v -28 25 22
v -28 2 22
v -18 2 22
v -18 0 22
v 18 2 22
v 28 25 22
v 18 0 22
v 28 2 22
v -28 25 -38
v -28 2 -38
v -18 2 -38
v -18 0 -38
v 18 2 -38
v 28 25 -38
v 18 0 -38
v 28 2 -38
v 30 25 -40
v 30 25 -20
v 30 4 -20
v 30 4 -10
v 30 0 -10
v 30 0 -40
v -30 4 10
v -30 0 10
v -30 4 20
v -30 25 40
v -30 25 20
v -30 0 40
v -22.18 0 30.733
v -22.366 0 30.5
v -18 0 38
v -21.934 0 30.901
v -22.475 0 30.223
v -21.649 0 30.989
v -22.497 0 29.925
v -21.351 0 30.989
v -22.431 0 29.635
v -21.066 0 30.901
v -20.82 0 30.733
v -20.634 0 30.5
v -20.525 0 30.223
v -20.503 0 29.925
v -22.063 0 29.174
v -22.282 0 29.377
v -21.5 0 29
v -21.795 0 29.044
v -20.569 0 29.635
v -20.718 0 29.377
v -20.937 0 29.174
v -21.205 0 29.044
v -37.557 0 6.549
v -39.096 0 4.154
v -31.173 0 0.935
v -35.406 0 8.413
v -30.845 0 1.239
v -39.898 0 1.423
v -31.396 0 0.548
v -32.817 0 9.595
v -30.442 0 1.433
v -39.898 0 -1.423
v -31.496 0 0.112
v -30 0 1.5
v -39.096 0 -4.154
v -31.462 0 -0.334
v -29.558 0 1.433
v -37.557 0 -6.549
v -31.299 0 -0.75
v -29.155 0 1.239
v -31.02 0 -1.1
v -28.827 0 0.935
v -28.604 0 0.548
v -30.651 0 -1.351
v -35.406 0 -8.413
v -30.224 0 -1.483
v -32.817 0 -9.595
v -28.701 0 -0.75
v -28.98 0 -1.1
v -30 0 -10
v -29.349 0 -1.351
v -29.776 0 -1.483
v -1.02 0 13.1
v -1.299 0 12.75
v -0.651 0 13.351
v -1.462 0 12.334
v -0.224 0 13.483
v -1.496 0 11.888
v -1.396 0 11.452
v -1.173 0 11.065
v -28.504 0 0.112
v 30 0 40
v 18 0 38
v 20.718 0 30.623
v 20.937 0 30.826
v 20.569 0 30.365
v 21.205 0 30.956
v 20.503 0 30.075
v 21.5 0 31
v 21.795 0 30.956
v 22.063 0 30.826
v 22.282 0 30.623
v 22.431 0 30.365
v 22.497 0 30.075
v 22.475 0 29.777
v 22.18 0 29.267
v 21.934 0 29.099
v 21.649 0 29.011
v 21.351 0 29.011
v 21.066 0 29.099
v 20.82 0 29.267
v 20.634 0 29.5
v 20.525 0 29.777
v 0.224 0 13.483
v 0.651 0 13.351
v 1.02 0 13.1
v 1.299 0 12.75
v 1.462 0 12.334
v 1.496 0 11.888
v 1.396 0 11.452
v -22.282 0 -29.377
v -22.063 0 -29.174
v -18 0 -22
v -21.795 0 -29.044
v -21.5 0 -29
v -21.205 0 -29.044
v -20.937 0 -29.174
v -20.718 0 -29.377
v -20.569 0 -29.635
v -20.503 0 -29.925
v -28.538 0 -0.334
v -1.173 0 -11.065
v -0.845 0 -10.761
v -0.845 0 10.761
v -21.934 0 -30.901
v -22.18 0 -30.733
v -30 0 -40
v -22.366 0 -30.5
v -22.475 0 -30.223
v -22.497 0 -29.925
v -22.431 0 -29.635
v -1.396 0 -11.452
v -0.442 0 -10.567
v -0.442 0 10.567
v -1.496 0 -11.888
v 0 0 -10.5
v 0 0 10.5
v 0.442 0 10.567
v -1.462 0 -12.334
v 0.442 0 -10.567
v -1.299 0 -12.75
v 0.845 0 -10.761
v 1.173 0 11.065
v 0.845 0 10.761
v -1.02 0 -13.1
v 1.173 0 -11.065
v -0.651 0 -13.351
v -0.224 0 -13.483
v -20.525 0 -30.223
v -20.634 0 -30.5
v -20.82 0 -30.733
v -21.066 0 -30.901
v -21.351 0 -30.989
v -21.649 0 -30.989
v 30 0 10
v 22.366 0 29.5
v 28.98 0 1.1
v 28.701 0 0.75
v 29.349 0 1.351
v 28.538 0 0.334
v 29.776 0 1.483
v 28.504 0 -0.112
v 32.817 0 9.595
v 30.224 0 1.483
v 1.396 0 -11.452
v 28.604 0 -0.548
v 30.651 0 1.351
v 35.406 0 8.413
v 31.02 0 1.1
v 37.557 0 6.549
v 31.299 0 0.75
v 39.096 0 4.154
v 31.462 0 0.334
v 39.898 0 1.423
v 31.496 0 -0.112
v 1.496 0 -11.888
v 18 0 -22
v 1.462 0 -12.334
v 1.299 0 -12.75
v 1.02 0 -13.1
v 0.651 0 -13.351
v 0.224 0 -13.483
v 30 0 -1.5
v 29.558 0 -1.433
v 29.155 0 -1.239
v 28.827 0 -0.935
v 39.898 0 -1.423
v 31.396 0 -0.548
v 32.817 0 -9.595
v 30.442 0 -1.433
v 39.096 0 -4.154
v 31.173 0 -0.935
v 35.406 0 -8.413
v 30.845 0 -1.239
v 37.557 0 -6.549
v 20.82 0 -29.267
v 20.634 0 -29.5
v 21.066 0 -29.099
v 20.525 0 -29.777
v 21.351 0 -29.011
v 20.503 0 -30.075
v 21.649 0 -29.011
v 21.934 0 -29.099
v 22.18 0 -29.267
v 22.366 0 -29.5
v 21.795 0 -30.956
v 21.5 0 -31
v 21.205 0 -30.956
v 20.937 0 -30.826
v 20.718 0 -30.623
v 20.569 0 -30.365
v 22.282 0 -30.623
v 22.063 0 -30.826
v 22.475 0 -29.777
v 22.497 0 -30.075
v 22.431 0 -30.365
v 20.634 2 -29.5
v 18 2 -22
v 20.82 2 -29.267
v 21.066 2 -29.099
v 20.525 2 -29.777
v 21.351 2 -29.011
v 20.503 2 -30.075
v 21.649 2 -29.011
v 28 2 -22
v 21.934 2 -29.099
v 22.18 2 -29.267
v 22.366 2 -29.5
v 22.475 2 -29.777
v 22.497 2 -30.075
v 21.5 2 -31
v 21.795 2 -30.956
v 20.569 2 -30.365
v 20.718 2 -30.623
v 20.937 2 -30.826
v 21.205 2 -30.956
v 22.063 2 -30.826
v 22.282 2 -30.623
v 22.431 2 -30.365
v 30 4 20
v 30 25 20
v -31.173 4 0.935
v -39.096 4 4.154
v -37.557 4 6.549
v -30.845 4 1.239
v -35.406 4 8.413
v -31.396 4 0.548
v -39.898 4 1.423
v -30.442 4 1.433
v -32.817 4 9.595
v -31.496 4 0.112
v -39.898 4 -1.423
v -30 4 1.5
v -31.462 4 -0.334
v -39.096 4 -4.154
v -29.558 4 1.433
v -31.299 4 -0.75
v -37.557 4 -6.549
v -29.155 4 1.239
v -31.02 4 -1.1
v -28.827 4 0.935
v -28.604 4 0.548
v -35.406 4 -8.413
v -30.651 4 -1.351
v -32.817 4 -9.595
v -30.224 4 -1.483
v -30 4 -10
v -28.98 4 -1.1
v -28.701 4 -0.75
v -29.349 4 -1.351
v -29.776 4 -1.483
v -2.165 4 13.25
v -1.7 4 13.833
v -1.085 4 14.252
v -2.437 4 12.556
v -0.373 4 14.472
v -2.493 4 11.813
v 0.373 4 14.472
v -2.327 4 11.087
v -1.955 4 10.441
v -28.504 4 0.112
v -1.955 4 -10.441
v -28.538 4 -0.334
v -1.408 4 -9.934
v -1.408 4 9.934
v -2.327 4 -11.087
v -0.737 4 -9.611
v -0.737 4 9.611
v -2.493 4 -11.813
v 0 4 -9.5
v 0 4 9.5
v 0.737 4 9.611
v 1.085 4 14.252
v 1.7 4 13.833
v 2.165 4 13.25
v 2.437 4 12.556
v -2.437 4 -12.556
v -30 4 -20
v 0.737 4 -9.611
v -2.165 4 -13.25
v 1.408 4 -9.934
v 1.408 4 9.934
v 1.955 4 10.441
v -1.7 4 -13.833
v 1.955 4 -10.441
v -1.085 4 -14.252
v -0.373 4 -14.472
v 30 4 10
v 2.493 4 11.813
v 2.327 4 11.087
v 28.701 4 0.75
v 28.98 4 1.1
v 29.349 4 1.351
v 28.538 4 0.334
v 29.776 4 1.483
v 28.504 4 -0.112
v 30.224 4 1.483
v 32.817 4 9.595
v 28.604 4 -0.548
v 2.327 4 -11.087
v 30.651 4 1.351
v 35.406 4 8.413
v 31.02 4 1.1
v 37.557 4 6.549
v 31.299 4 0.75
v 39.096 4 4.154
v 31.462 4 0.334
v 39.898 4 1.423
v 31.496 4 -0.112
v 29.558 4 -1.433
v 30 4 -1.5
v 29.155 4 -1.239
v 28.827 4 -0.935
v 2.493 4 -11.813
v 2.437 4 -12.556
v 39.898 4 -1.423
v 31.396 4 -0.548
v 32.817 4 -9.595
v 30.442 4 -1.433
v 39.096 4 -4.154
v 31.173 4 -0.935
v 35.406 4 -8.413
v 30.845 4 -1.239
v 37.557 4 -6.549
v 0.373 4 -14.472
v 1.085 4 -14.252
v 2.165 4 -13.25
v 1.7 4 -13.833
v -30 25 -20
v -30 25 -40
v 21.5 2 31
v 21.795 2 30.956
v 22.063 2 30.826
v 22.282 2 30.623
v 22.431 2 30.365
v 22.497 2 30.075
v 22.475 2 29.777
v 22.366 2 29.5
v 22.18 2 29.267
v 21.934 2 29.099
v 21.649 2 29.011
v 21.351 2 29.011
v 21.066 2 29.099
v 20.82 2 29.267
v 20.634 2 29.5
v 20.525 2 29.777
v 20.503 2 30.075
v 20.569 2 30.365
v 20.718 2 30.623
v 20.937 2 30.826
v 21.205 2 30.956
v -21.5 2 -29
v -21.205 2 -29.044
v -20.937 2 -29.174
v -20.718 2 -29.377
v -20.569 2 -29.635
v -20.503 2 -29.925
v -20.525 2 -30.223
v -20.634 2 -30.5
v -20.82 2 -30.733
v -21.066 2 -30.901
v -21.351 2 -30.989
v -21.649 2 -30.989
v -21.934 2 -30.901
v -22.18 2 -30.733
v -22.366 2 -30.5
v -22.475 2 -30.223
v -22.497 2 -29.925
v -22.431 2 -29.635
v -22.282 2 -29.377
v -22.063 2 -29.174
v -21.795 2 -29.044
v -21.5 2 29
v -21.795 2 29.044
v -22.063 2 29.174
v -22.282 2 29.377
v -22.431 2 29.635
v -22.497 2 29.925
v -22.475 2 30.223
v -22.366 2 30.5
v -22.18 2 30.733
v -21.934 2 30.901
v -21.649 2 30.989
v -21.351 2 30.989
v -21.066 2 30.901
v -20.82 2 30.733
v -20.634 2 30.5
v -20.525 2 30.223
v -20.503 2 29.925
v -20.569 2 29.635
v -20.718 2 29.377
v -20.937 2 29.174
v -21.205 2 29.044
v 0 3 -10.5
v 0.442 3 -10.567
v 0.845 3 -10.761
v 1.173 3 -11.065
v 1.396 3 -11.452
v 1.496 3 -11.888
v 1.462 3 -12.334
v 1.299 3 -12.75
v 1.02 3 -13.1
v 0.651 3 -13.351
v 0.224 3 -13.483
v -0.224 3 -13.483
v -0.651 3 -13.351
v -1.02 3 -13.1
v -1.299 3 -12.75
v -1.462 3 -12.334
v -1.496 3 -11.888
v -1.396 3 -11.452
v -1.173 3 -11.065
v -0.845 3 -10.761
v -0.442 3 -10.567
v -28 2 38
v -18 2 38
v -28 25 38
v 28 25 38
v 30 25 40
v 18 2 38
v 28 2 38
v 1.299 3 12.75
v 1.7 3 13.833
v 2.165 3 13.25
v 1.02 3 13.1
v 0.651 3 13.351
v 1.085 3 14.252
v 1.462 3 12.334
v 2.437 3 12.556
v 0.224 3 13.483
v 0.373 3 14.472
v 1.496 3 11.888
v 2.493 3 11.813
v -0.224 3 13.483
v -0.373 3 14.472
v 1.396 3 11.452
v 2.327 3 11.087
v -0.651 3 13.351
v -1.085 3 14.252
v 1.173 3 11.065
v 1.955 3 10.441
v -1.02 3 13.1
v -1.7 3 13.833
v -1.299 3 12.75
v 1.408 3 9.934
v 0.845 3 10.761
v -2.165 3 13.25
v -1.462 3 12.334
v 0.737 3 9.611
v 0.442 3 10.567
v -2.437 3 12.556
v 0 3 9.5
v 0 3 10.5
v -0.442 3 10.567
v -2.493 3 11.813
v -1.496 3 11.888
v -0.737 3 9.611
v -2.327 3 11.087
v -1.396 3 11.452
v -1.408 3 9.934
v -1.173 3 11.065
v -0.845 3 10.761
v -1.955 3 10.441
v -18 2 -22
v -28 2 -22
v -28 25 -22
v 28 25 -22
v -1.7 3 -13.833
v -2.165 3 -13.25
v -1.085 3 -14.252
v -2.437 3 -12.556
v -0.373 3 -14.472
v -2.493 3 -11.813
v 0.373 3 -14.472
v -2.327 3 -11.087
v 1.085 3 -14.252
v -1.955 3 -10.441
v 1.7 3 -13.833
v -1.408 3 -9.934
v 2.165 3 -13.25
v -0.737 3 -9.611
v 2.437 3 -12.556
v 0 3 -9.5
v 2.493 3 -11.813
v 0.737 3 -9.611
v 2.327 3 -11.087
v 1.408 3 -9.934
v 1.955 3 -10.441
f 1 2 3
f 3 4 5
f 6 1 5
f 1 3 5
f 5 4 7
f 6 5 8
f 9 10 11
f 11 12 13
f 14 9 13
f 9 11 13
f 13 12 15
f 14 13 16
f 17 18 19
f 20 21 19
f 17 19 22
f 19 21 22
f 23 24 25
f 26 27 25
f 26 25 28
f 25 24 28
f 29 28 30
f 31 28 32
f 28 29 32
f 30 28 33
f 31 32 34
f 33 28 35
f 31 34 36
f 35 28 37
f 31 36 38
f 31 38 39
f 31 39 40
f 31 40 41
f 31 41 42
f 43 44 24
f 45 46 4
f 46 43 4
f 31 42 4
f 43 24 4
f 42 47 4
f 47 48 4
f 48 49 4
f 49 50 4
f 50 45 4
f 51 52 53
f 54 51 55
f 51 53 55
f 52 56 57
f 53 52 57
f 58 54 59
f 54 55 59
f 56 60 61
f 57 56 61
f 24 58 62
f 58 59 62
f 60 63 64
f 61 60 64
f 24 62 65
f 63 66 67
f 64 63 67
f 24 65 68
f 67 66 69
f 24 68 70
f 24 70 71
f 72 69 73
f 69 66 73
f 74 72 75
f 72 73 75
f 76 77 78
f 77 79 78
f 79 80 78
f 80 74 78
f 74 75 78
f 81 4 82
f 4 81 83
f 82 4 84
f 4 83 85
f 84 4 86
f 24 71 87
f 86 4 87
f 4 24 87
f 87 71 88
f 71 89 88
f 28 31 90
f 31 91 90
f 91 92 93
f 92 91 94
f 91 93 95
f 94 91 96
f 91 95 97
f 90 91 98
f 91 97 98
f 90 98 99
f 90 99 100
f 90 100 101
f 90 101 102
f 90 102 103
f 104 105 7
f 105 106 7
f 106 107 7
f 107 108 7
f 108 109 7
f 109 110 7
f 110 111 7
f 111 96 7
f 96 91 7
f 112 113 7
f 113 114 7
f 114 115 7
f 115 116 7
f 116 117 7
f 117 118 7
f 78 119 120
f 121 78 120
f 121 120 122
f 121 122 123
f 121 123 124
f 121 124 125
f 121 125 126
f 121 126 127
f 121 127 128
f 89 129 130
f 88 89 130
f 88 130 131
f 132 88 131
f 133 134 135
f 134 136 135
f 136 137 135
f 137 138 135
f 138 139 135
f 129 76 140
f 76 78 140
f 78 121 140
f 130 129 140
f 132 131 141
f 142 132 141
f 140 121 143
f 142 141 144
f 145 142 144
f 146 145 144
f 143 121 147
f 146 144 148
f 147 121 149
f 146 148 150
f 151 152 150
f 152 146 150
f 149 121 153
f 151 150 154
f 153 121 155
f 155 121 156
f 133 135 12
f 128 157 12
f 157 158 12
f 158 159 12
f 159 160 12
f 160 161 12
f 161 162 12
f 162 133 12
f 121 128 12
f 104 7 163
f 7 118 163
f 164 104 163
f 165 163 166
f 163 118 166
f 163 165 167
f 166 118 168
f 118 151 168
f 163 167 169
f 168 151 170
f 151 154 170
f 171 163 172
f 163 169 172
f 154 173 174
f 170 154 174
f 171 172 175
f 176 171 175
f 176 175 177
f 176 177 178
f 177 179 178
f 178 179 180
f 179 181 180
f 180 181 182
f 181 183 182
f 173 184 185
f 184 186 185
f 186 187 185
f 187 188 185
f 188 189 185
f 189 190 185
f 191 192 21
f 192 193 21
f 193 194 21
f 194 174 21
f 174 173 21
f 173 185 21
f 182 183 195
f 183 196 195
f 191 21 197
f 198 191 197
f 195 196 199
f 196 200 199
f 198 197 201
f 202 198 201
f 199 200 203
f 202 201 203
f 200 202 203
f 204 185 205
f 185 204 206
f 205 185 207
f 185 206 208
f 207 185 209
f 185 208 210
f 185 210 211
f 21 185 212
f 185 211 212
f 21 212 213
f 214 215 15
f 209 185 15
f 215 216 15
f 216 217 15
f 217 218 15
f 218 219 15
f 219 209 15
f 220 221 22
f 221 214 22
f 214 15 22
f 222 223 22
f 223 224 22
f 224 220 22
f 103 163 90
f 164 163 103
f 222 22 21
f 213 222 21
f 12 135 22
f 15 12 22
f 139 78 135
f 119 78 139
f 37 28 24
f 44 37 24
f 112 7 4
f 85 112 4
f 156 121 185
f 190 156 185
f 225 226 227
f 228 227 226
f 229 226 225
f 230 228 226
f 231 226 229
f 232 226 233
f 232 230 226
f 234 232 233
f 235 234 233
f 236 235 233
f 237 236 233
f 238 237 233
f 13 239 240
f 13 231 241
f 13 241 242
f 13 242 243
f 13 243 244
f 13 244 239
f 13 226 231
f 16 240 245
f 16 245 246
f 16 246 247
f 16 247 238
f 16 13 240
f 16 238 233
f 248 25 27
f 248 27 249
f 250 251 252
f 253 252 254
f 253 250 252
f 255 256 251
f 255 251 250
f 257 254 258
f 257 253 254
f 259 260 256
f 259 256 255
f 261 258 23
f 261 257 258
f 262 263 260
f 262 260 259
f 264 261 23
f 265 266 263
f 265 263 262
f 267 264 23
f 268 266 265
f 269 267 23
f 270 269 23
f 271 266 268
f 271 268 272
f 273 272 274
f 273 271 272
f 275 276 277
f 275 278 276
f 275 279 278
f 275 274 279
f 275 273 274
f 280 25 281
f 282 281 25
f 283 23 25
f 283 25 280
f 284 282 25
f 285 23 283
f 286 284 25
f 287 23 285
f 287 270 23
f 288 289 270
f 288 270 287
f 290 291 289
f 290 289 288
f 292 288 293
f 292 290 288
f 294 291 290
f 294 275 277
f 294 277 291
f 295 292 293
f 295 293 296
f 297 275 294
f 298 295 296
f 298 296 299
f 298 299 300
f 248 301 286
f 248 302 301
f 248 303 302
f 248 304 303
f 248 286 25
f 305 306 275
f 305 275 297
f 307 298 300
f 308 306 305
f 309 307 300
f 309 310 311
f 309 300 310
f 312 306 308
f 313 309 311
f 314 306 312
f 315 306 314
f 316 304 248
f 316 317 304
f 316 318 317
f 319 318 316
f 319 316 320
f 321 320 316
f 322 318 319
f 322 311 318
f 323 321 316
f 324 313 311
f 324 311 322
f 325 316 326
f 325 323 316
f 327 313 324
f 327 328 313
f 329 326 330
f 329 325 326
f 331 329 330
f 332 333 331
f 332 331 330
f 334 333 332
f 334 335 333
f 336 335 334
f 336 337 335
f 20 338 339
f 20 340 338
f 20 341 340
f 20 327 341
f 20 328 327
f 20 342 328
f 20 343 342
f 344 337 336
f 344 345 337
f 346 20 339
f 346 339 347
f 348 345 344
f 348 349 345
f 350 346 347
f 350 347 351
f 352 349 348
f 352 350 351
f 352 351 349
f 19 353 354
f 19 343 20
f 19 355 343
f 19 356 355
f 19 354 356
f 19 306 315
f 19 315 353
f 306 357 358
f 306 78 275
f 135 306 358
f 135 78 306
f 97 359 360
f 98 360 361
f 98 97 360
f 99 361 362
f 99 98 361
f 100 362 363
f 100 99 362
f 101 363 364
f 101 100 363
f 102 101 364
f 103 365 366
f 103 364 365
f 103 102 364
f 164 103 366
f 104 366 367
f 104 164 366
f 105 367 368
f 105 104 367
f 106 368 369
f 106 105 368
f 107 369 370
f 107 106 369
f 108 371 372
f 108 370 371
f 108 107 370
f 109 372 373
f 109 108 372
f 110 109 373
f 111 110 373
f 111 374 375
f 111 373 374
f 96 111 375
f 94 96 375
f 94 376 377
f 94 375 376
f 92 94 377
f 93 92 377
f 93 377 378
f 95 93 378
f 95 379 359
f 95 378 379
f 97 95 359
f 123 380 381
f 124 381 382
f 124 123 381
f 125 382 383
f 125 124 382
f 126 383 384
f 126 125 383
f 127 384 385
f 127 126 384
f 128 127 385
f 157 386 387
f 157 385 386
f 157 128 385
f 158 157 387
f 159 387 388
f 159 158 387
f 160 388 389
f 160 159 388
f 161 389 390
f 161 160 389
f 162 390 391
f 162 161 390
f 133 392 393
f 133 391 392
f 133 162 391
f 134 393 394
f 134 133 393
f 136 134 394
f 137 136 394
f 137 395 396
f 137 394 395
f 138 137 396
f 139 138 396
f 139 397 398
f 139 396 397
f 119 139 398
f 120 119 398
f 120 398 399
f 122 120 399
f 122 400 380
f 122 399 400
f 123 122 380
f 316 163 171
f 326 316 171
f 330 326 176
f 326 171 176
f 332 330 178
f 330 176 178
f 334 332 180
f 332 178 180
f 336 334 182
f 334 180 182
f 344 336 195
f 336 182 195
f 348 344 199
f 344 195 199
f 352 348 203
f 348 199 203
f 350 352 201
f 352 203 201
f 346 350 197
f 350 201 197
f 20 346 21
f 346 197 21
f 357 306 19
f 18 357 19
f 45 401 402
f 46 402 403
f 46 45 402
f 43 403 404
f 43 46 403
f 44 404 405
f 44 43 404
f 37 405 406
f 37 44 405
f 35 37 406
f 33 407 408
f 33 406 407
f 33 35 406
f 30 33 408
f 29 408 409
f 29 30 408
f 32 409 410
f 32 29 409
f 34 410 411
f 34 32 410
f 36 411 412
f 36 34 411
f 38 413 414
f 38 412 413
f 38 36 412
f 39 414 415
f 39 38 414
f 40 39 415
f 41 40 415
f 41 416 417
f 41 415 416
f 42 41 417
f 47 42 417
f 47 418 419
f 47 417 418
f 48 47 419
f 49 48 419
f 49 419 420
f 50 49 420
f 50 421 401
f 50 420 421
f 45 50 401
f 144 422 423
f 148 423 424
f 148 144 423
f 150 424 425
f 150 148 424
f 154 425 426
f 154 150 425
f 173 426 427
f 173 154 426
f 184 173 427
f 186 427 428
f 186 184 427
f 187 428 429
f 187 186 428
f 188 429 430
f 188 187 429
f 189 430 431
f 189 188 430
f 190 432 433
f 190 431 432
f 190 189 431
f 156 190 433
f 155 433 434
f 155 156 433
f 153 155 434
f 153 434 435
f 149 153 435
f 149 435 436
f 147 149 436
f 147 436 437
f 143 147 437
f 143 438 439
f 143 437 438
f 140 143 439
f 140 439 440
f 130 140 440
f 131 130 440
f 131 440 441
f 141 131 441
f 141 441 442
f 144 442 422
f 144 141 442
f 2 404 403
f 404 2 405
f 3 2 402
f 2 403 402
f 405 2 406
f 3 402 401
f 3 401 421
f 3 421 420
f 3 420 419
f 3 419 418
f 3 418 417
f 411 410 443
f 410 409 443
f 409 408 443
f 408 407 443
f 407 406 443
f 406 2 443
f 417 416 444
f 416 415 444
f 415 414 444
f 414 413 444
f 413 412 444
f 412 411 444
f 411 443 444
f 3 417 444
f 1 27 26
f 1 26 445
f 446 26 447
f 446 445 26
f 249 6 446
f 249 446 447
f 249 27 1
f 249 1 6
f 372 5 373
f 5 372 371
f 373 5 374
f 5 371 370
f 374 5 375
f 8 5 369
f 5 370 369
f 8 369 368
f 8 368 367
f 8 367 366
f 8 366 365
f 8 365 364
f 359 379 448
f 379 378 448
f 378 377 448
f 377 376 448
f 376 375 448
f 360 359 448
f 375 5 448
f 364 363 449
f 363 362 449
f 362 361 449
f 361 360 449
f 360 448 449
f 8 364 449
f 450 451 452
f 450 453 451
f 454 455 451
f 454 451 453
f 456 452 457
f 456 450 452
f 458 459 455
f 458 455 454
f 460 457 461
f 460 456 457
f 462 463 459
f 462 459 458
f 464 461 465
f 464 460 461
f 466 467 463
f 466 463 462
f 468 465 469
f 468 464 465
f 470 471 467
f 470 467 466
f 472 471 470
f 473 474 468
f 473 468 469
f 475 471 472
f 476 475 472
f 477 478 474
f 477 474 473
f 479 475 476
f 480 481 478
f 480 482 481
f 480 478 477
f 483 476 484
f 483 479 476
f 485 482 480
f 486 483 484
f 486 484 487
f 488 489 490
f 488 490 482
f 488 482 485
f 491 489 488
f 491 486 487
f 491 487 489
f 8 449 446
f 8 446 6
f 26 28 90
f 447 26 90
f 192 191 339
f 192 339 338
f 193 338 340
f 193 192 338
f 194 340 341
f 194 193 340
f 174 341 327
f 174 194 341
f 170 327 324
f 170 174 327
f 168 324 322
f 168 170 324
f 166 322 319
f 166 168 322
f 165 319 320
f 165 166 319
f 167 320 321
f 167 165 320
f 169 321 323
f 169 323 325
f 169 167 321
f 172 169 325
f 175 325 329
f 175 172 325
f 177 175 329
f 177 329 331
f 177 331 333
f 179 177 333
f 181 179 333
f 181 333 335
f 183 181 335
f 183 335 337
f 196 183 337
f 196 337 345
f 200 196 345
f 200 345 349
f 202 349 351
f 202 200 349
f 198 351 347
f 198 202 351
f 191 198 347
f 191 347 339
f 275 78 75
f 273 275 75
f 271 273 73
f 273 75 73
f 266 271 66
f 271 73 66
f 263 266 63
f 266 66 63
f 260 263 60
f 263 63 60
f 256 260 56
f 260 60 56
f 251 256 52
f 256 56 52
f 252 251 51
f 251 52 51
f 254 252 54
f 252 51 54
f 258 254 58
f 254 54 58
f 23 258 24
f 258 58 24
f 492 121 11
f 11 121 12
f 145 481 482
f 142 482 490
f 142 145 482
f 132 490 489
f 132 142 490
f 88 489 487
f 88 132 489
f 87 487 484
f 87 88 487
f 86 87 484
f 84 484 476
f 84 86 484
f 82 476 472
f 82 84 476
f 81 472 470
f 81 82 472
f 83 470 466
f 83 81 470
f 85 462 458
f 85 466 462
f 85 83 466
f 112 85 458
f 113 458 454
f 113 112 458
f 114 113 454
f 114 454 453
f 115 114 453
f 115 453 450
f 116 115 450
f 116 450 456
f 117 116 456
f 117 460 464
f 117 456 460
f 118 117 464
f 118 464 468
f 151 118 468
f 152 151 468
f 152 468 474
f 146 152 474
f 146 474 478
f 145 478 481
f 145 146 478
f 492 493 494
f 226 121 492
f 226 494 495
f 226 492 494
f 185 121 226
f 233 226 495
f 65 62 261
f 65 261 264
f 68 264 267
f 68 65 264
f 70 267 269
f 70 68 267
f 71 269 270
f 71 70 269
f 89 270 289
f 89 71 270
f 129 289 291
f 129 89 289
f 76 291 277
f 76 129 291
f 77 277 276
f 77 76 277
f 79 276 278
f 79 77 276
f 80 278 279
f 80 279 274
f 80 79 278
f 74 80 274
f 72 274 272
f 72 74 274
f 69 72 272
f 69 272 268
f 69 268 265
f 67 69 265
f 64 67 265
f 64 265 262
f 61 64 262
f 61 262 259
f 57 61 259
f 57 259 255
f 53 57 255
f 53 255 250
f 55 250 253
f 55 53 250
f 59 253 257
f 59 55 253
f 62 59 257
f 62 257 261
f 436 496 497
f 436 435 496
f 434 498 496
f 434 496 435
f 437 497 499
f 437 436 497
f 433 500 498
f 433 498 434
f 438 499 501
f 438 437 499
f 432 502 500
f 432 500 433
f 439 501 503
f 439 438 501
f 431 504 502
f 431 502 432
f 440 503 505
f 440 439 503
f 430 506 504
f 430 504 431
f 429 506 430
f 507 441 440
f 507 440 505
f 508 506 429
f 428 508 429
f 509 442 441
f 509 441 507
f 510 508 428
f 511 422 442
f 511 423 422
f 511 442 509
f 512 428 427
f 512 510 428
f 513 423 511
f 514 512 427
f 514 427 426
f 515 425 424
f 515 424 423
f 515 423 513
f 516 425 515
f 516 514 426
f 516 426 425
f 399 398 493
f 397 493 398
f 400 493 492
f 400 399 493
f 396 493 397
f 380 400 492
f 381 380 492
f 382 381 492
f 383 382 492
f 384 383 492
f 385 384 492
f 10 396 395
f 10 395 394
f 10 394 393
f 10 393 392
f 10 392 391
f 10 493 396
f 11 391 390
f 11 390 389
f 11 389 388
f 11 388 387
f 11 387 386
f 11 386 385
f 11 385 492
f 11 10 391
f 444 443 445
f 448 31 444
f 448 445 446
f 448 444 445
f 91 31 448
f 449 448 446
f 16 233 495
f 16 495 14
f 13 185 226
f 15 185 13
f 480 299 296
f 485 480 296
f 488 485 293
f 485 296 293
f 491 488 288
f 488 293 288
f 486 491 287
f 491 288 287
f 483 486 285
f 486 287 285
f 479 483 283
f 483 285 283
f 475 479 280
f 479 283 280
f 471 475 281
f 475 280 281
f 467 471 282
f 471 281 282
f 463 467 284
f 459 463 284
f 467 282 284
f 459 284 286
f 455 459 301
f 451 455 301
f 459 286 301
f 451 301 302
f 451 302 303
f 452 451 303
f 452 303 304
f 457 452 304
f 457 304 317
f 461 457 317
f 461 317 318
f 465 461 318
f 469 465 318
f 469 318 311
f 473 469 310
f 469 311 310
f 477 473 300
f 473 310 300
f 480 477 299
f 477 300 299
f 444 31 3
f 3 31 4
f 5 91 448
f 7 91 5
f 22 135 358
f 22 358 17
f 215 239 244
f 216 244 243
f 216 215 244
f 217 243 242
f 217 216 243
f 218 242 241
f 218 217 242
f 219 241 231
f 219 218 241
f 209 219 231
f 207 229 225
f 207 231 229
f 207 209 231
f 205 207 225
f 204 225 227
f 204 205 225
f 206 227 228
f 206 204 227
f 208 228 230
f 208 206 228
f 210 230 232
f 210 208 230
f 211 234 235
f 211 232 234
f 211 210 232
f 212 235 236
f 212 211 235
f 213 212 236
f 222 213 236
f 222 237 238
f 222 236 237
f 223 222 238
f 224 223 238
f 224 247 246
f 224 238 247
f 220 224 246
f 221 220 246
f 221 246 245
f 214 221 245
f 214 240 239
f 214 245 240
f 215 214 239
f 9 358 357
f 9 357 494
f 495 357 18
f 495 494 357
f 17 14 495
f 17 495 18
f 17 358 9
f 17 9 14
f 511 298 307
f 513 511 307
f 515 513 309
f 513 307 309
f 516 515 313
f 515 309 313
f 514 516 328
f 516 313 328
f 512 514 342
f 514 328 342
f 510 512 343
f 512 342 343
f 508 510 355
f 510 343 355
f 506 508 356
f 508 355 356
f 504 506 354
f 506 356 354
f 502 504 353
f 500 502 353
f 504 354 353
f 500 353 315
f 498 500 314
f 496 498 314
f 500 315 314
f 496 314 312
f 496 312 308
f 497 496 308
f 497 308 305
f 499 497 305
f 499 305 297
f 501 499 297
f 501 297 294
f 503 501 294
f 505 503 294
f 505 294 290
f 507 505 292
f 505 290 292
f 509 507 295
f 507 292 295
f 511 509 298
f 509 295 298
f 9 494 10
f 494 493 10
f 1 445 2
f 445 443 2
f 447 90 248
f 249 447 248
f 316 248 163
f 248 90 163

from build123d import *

# Parameters (mm, degrees)
SKETCH1_R           = 1.5
SKETCH1_R_2         = 1
SKETCH1_W           = 36
SKETCH1_H           = 16
BOSS_EXTRUDE1_DEPTH = 4
SKETCH3_W           = 60
SKETCH3_H           = 20
SKETCH3_W_2         = 56
SKETCH3_H_2         = 16
BOSS_EXTRUDE2_DEPTH = 21
SKETCH4_R           = 2.5
CUT_EXTRUDE1_DEPTH  = 1
SKETCH5_W           = 56
SKETCH5_H           = 16
CUT_EXTRUDE2_DEPTH  = 23


with BuildPart() as part:
    # Sketch1 → Boss-Extrude1 (new body)
    with BuildSketch(Plane(origin=(0, 0, 0), x_dir=(1, 0, 0), z_dir=(0, 1, 0))):
        with BuildLine():
            Line((-30, -40), (30, -40))
            Line((30, -40), (30, -10))
            ThreePointArc((30, -10), (40, 0), (30, 10))
            Line((30, 10), (30, 40))
            Line((30, 40), (-30, 40))
            Line((-30, 40), (-30, 10))
            ThreePointArc((-30, 10), (-40, 0), (-30, -10))
            Line((-30, -10), (-30, -40))
        make_face()
        with Locations(Location((30, 0, 0), (0, 0, 90))):
            Circle(SKETCH1_R, mode=Mode.SUBTRACT)
        with Locations(Location((-30, 0, 0), (0, 0, 270))):
            Circle(SKETCH1_R, mode=Mode.SUBTRACT)
        with Locations(Location((0, 12, 0), (0, 0, 270))):
            Circle(SKETCH1_R, mode=Mode.SUBTRACT)
        with Locations(Location((0, -12, 0), (0, 0, 90))):
            Circle(SKETCH1_R, mode=Mode.SUBTRACT)
        with Locations(Location((-21.5, 30, 0), (0, 0, 270))):
            Circle(SKETCH1_R_2, mode=Mode.SUBTRACT)
        with Locations(Location((21.5, 30, 0), (0, 0, 90))):
            Circle(SKETCH1_R_2, mode=Mode.SUBTRACT)
        with Locations(Location((21.5, -30, 0), (0, 0, 270))):
            Circle(SKETCH1_R_2, mode=Mode.SUBTRACT)
        with Locations(Location((-21.5, -30, 0), (0, 0, 90))):
            Circle(SKETCH1_R_2, mode=Mode.SUBTRACT)
        with Locations((0, -30)):
            Rectangle(SKETCH1_W, SKETCH1_H, mode=Mode.SUBTRACT)
        with Locations((0, 30)):
            Rectangle(SKETCH1_W, SKETCH1_H, mode=Mode.SUBTRACT)
    extrude(amount=BOSS_EXTRUDE1_DEPTH)

    # Sketch3 → Boss-Extrude2 (add)
    # profile 1 of 2: a face of its own
    with BuildSketch(Plane(origin=(0, 4, 0), x_dir=(1, 0, 0), z_dir=(0, 1, 0))):
        with Locations((0, 30)):
            Rectangle(SKETCH3_W, SKETCH3_H)
        with Locations((0, 30)):
            Rectangle(SKETCH3_W_2, SKETCH3_H_2, mode=Mode.SUBTRACT)
    # profile 2 of 2: a face of its own
    with BuildSketch(Plane(origin=(0, 4, 0), x_dir=(1, 0, 0), z_dir=(0, 1, 0))):
        with Locations((0, -30)):
            Rectangle(SKETCH3_W, SKETCH3_H)
        with Locations((0, -30)):
            Rectangle(SKETCH3_W_2, SKETCH3_H_2, mode=Mode.SUBTRACT)
    extrude(amount=BOSS_EXTRUDE2_DEPTH)

    # Sketch4 → Cut-Extrude1 (cut)
    with BuildSketch(Plane(origin=(0, 4, 0), x_dir=(1, 0, 0), z_dir=(0, 1, 0))):
        with Locations(Location((0, 12, 0), (0, 0, 270))):
            Circle(SKETCH4_R)
        with Locations(Location((0, -12, 0), (0, 0, 90))):
            Circle(SKETCH4_R)
    extrude(amount=-CUT_EXTRUDE1_DEPTH, mode=Mode.SUBTRACT)

    # Sketch5 → Cut-Extrude2 (cut)
    with BuildSketch(Plane(origin=(0, 25, 0), x_dir=(1, 0, 0), z_dir=(0, 1, 0))):
        with Locations((0, 30)):
            Rectangle(SKETCH5_W, SKETCH5_H)
    cut_extrude2 = extrude(amount=-CUT_EXTRUDE2_DEPTH, mode=Mode.SUBTRACT)

    # Mirror1: Cut-Extrude2 across plane
    add(cut_extrude2.mirror(Plane.XY), mode=Mode.SUBTRACT)


solid = part.part
